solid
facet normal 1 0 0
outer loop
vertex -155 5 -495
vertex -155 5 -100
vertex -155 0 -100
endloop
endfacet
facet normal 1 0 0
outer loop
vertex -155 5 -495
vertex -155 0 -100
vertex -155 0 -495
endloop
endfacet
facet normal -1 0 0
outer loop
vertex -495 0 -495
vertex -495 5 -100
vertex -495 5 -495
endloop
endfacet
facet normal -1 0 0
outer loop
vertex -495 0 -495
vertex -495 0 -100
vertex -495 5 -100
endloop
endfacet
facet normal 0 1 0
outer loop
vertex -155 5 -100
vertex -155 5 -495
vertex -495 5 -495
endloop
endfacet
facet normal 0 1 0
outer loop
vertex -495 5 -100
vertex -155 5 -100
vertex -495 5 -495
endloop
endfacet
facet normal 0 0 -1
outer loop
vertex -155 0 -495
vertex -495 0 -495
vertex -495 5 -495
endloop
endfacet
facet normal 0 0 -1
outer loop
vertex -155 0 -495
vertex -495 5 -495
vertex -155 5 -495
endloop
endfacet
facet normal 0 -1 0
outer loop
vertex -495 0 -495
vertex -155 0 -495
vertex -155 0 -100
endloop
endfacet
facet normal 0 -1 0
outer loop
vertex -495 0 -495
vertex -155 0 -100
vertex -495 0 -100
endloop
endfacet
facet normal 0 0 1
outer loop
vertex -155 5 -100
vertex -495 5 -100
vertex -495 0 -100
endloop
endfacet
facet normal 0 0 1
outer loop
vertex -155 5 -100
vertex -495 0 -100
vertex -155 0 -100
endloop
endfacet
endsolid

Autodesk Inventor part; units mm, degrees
ref_plane "YZ Plane" through (0, 0, 0) normal (1, 0, 0) x (0, 1, 0)
ref_plane "XZ Plane" through (0, 0, 0) normal (0, 1, 0) x (-1, 0, 0)
ref_plane "XY Plane" through (0, 0, 0) normal (0, 0, 1) x (1, 0, 0)
sketch "Esquisse1" plane through (0, 0, 0) normal (0, 1, 0) x (-1, 0, 0)
  line L0 (0, 0) -> (495, 0)
  line L1 (495, 0) -> (495, -495)
  line L2 (495, -495) -> (0, -495)
  line L3 (0, -495) -> (0, 0)
  dimension "d0" = 495
  dimension "d1" = 495
extrude "Extrusion1" add sketch "Esquisse1" along normal blind 5
sketch "Esquisse2" plane through (0, 5, 0) normal (0, 1, 0) x (1, 0, 0)
  line L0 (0, 0) -> (0, 495) projected
  line L1 (0, 0) -> (-495, 0)
  line L2 (-495, 0) -> (-495, 100)
  line L3 (-495, 100) -> (0, 100)
  line L4 (0, 100) -> (0, 0)
  dimension "d4" = 495
  dimension "d5" = 100
extrude "Extrusion2" cut sketch "Esquisse2" against normal blind 5
sketch "Esquisse3" plane through (0, 5, 0) normal (0, 1, 0) x (1, 0, 0)
  line L0 (0, 100) -> (-495, 100) projected
  line L1 (0, 495) -> (-495, 495) projected
  line L2 (0, 100) -> (-155, 100)
  line L3 (-155, 100) -> (-155, 495)
  line L4 (-155, 495) -> (0, 495)
  line L5 (0, 495) -> (0, 100)
  point P0 (0, 0)
  dimension "d8" = 155
extrude "Extrusion3" cut sketch "Esquisse3" against normal blind 5
properties part number "planche" material "Bois (bouleau)"
